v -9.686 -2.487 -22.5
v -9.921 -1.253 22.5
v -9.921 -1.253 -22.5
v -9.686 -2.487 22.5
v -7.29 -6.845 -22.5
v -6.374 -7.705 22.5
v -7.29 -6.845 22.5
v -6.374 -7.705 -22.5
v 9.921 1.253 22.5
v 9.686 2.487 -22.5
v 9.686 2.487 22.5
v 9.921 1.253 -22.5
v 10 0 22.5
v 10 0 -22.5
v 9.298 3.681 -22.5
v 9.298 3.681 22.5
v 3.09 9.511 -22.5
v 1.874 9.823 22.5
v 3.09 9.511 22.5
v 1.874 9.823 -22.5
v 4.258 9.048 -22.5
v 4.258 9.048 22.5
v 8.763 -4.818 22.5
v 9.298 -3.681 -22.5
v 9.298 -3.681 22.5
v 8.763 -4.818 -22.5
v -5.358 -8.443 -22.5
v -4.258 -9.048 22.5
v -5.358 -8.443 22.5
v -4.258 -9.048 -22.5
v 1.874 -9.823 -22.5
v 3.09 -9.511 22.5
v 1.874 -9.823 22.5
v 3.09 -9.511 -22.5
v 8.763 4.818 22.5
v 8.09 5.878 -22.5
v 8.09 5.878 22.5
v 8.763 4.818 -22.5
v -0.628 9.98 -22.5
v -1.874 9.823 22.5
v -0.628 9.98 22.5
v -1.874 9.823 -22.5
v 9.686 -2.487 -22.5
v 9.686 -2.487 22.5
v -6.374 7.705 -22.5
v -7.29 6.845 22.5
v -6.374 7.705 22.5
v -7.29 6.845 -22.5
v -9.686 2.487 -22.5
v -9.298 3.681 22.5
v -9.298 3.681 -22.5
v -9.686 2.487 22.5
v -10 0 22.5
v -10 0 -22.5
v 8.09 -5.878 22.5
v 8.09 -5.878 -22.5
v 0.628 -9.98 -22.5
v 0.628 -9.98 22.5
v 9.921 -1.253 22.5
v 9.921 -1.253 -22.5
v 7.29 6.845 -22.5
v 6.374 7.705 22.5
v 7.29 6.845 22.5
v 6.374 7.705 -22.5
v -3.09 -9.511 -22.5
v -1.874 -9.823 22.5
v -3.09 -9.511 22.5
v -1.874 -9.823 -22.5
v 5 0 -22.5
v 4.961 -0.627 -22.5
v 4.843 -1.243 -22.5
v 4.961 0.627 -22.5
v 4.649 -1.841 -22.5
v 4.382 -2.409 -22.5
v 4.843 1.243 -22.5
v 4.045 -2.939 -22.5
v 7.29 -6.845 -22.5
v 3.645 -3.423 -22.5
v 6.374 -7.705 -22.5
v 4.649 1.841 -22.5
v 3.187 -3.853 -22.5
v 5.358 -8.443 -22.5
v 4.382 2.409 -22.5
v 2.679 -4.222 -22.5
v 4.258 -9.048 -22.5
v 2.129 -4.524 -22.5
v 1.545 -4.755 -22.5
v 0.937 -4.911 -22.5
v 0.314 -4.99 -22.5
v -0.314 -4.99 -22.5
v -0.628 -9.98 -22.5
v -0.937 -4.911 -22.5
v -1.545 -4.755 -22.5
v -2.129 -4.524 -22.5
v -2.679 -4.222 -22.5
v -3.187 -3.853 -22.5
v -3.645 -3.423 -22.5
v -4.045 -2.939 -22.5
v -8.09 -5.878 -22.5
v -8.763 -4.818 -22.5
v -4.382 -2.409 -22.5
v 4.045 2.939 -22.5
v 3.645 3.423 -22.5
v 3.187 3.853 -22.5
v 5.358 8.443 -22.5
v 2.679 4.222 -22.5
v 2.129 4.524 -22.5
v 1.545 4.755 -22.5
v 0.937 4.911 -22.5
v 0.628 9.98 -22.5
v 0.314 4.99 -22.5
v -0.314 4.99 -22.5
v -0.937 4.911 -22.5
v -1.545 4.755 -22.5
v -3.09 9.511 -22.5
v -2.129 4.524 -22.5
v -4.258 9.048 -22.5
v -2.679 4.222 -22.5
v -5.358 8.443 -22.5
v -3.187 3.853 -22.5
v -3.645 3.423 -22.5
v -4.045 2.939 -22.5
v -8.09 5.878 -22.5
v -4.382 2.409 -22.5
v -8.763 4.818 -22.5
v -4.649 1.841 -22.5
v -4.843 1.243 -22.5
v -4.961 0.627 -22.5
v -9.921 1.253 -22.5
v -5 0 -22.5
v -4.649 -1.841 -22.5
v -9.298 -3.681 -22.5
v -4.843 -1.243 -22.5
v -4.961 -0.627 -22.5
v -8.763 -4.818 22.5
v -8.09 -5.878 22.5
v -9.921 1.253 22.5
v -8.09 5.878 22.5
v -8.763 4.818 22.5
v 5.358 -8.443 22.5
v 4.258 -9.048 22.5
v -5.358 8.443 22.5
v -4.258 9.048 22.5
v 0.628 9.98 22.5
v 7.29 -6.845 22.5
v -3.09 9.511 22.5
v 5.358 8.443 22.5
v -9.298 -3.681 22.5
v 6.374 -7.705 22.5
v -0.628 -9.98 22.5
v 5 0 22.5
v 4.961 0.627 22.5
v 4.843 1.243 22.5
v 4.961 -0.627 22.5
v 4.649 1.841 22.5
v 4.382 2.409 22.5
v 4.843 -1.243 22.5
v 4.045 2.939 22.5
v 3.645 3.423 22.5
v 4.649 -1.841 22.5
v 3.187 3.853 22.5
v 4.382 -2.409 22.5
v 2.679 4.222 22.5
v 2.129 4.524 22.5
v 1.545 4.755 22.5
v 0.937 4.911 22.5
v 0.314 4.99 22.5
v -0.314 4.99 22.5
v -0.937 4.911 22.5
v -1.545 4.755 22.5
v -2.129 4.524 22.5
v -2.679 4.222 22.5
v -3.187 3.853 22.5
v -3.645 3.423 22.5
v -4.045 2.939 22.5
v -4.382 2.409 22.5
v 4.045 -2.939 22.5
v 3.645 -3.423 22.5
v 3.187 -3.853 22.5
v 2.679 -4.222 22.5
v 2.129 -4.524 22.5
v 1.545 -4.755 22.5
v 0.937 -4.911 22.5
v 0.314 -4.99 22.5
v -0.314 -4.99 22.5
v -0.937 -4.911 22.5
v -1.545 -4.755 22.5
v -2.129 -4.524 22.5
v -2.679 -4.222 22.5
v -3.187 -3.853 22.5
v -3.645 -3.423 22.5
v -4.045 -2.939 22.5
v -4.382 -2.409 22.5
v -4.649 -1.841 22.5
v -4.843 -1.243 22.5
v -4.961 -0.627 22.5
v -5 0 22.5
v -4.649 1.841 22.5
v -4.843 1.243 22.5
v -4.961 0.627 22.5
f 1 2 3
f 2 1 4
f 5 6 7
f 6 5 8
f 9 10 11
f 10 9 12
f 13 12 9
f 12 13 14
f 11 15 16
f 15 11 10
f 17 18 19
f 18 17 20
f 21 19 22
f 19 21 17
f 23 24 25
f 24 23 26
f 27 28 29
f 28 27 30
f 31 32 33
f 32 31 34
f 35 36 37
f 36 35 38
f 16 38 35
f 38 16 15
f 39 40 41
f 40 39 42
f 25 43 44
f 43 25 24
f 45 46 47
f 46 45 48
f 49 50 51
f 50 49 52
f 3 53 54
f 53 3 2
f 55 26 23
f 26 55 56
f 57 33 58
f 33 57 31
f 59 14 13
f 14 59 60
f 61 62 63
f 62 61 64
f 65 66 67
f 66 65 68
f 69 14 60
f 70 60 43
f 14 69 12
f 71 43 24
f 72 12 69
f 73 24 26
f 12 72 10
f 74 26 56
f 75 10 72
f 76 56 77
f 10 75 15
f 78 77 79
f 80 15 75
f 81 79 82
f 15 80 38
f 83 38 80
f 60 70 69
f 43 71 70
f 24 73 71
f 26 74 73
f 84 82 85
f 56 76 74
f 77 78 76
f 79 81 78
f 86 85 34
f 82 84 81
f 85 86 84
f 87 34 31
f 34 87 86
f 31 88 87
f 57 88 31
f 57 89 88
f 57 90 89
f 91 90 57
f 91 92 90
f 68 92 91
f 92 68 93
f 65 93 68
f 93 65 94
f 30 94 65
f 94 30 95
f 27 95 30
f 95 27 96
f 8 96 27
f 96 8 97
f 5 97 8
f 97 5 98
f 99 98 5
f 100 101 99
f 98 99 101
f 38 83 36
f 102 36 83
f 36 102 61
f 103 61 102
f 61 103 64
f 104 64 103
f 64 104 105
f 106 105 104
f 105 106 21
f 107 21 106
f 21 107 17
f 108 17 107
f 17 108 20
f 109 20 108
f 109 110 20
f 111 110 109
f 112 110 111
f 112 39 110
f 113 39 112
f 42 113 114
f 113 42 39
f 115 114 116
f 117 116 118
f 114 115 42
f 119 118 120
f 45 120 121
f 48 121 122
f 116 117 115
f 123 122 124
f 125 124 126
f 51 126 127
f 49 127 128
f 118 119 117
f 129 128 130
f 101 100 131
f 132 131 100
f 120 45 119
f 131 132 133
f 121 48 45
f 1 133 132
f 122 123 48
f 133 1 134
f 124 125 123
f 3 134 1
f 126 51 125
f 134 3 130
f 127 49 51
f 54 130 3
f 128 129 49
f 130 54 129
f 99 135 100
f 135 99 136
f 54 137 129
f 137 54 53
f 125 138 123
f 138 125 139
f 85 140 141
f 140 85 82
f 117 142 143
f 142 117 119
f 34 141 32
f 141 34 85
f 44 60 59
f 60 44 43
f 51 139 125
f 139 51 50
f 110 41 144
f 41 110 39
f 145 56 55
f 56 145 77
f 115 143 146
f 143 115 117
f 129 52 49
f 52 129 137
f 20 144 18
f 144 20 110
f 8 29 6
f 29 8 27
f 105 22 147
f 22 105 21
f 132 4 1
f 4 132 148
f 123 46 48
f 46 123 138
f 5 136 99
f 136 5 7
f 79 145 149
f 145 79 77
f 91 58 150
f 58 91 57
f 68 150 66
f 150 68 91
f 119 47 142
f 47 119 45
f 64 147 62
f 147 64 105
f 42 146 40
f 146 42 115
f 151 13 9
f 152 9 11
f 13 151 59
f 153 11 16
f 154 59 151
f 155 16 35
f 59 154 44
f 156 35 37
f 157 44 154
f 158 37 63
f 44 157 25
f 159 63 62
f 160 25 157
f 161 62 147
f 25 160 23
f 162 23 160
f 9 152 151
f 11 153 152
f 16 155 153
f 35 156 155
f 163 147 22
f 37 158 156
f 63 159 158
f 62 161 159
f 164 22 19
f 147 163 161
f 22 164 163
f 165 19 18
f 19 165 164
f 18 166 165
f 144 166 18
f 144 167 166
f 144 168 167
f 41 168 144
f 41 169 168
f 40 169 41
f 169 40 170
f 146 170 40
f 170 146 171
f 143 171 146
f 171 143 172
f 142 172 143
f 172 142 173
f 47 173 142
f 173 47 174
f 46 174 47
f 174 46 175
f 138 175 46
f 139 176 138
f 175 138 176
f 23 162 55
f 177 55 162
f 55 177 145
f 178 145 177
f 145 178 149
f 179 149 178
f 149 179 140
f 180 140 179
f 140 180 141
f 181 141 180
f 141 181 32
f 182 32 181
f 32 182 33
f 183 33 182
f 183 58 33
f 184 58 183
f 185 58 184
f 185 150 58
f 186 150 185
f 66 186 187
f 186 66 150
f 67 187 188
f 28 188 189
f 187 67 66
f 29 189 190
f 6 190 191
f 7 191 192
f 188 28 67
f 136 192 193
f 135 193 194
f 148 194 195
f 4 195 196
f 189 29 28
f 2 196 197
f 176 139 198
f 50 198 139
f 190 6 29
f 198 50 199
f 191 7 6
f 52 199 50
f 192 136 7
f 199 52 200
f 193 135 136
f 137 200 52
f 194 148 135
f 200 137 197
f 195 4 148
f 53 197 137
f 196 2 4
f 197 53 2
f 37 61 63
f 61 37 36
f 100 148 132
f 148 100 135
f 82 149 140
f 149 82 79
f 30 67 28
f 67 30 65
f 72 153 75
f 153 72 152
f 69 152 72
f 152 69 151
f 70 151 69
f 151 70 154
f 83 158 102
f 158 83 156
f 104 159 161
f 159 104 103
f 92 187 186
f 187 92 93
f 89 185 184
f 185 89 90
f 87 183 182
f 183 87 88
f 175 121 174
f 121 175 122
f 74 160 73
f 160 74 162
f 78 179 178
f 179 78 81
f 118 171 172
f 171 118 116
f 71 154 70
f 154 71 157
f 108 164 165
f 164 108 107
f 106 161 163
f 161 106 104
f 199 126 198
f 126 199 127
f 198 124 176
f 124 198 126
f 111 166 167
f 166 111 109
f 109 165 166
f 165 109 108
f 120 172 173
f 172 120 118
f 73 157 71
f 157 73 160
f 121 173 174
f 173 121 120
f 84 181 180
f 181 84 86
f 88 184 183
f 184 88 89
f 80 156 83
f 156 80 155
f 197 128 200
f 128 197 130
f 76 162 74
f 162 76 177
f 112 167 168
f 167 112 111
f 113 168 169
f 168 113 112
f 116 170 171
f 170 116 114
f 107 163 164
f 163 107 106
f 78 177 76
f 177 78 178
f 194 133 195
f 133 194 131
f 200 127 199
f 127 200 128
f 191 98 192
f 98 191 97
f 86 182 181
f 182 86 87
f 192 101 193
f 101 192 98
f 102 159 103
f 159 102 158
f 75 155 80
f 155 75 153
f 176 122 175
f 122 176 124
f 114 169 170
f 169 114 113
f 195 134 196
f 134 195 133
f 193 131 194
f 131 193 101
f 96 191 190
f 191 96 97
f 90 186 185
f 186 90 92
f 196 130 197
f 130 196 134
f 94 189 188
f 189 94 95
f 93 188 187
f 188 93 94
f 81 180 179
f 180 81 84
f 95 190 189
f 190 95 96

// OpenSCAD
$fn = 50;


difference() {
	union() {
		translate(v = [0, 0, -22.5000000000]) {
			cylinder(h = 45, r = 10.0000000000);
		}
	}
	union() {
		translate(v = [0, 0, -100.0000000000]) {
			cylinder(h = 200, r = 5.0000000000);
		}
	}
}
